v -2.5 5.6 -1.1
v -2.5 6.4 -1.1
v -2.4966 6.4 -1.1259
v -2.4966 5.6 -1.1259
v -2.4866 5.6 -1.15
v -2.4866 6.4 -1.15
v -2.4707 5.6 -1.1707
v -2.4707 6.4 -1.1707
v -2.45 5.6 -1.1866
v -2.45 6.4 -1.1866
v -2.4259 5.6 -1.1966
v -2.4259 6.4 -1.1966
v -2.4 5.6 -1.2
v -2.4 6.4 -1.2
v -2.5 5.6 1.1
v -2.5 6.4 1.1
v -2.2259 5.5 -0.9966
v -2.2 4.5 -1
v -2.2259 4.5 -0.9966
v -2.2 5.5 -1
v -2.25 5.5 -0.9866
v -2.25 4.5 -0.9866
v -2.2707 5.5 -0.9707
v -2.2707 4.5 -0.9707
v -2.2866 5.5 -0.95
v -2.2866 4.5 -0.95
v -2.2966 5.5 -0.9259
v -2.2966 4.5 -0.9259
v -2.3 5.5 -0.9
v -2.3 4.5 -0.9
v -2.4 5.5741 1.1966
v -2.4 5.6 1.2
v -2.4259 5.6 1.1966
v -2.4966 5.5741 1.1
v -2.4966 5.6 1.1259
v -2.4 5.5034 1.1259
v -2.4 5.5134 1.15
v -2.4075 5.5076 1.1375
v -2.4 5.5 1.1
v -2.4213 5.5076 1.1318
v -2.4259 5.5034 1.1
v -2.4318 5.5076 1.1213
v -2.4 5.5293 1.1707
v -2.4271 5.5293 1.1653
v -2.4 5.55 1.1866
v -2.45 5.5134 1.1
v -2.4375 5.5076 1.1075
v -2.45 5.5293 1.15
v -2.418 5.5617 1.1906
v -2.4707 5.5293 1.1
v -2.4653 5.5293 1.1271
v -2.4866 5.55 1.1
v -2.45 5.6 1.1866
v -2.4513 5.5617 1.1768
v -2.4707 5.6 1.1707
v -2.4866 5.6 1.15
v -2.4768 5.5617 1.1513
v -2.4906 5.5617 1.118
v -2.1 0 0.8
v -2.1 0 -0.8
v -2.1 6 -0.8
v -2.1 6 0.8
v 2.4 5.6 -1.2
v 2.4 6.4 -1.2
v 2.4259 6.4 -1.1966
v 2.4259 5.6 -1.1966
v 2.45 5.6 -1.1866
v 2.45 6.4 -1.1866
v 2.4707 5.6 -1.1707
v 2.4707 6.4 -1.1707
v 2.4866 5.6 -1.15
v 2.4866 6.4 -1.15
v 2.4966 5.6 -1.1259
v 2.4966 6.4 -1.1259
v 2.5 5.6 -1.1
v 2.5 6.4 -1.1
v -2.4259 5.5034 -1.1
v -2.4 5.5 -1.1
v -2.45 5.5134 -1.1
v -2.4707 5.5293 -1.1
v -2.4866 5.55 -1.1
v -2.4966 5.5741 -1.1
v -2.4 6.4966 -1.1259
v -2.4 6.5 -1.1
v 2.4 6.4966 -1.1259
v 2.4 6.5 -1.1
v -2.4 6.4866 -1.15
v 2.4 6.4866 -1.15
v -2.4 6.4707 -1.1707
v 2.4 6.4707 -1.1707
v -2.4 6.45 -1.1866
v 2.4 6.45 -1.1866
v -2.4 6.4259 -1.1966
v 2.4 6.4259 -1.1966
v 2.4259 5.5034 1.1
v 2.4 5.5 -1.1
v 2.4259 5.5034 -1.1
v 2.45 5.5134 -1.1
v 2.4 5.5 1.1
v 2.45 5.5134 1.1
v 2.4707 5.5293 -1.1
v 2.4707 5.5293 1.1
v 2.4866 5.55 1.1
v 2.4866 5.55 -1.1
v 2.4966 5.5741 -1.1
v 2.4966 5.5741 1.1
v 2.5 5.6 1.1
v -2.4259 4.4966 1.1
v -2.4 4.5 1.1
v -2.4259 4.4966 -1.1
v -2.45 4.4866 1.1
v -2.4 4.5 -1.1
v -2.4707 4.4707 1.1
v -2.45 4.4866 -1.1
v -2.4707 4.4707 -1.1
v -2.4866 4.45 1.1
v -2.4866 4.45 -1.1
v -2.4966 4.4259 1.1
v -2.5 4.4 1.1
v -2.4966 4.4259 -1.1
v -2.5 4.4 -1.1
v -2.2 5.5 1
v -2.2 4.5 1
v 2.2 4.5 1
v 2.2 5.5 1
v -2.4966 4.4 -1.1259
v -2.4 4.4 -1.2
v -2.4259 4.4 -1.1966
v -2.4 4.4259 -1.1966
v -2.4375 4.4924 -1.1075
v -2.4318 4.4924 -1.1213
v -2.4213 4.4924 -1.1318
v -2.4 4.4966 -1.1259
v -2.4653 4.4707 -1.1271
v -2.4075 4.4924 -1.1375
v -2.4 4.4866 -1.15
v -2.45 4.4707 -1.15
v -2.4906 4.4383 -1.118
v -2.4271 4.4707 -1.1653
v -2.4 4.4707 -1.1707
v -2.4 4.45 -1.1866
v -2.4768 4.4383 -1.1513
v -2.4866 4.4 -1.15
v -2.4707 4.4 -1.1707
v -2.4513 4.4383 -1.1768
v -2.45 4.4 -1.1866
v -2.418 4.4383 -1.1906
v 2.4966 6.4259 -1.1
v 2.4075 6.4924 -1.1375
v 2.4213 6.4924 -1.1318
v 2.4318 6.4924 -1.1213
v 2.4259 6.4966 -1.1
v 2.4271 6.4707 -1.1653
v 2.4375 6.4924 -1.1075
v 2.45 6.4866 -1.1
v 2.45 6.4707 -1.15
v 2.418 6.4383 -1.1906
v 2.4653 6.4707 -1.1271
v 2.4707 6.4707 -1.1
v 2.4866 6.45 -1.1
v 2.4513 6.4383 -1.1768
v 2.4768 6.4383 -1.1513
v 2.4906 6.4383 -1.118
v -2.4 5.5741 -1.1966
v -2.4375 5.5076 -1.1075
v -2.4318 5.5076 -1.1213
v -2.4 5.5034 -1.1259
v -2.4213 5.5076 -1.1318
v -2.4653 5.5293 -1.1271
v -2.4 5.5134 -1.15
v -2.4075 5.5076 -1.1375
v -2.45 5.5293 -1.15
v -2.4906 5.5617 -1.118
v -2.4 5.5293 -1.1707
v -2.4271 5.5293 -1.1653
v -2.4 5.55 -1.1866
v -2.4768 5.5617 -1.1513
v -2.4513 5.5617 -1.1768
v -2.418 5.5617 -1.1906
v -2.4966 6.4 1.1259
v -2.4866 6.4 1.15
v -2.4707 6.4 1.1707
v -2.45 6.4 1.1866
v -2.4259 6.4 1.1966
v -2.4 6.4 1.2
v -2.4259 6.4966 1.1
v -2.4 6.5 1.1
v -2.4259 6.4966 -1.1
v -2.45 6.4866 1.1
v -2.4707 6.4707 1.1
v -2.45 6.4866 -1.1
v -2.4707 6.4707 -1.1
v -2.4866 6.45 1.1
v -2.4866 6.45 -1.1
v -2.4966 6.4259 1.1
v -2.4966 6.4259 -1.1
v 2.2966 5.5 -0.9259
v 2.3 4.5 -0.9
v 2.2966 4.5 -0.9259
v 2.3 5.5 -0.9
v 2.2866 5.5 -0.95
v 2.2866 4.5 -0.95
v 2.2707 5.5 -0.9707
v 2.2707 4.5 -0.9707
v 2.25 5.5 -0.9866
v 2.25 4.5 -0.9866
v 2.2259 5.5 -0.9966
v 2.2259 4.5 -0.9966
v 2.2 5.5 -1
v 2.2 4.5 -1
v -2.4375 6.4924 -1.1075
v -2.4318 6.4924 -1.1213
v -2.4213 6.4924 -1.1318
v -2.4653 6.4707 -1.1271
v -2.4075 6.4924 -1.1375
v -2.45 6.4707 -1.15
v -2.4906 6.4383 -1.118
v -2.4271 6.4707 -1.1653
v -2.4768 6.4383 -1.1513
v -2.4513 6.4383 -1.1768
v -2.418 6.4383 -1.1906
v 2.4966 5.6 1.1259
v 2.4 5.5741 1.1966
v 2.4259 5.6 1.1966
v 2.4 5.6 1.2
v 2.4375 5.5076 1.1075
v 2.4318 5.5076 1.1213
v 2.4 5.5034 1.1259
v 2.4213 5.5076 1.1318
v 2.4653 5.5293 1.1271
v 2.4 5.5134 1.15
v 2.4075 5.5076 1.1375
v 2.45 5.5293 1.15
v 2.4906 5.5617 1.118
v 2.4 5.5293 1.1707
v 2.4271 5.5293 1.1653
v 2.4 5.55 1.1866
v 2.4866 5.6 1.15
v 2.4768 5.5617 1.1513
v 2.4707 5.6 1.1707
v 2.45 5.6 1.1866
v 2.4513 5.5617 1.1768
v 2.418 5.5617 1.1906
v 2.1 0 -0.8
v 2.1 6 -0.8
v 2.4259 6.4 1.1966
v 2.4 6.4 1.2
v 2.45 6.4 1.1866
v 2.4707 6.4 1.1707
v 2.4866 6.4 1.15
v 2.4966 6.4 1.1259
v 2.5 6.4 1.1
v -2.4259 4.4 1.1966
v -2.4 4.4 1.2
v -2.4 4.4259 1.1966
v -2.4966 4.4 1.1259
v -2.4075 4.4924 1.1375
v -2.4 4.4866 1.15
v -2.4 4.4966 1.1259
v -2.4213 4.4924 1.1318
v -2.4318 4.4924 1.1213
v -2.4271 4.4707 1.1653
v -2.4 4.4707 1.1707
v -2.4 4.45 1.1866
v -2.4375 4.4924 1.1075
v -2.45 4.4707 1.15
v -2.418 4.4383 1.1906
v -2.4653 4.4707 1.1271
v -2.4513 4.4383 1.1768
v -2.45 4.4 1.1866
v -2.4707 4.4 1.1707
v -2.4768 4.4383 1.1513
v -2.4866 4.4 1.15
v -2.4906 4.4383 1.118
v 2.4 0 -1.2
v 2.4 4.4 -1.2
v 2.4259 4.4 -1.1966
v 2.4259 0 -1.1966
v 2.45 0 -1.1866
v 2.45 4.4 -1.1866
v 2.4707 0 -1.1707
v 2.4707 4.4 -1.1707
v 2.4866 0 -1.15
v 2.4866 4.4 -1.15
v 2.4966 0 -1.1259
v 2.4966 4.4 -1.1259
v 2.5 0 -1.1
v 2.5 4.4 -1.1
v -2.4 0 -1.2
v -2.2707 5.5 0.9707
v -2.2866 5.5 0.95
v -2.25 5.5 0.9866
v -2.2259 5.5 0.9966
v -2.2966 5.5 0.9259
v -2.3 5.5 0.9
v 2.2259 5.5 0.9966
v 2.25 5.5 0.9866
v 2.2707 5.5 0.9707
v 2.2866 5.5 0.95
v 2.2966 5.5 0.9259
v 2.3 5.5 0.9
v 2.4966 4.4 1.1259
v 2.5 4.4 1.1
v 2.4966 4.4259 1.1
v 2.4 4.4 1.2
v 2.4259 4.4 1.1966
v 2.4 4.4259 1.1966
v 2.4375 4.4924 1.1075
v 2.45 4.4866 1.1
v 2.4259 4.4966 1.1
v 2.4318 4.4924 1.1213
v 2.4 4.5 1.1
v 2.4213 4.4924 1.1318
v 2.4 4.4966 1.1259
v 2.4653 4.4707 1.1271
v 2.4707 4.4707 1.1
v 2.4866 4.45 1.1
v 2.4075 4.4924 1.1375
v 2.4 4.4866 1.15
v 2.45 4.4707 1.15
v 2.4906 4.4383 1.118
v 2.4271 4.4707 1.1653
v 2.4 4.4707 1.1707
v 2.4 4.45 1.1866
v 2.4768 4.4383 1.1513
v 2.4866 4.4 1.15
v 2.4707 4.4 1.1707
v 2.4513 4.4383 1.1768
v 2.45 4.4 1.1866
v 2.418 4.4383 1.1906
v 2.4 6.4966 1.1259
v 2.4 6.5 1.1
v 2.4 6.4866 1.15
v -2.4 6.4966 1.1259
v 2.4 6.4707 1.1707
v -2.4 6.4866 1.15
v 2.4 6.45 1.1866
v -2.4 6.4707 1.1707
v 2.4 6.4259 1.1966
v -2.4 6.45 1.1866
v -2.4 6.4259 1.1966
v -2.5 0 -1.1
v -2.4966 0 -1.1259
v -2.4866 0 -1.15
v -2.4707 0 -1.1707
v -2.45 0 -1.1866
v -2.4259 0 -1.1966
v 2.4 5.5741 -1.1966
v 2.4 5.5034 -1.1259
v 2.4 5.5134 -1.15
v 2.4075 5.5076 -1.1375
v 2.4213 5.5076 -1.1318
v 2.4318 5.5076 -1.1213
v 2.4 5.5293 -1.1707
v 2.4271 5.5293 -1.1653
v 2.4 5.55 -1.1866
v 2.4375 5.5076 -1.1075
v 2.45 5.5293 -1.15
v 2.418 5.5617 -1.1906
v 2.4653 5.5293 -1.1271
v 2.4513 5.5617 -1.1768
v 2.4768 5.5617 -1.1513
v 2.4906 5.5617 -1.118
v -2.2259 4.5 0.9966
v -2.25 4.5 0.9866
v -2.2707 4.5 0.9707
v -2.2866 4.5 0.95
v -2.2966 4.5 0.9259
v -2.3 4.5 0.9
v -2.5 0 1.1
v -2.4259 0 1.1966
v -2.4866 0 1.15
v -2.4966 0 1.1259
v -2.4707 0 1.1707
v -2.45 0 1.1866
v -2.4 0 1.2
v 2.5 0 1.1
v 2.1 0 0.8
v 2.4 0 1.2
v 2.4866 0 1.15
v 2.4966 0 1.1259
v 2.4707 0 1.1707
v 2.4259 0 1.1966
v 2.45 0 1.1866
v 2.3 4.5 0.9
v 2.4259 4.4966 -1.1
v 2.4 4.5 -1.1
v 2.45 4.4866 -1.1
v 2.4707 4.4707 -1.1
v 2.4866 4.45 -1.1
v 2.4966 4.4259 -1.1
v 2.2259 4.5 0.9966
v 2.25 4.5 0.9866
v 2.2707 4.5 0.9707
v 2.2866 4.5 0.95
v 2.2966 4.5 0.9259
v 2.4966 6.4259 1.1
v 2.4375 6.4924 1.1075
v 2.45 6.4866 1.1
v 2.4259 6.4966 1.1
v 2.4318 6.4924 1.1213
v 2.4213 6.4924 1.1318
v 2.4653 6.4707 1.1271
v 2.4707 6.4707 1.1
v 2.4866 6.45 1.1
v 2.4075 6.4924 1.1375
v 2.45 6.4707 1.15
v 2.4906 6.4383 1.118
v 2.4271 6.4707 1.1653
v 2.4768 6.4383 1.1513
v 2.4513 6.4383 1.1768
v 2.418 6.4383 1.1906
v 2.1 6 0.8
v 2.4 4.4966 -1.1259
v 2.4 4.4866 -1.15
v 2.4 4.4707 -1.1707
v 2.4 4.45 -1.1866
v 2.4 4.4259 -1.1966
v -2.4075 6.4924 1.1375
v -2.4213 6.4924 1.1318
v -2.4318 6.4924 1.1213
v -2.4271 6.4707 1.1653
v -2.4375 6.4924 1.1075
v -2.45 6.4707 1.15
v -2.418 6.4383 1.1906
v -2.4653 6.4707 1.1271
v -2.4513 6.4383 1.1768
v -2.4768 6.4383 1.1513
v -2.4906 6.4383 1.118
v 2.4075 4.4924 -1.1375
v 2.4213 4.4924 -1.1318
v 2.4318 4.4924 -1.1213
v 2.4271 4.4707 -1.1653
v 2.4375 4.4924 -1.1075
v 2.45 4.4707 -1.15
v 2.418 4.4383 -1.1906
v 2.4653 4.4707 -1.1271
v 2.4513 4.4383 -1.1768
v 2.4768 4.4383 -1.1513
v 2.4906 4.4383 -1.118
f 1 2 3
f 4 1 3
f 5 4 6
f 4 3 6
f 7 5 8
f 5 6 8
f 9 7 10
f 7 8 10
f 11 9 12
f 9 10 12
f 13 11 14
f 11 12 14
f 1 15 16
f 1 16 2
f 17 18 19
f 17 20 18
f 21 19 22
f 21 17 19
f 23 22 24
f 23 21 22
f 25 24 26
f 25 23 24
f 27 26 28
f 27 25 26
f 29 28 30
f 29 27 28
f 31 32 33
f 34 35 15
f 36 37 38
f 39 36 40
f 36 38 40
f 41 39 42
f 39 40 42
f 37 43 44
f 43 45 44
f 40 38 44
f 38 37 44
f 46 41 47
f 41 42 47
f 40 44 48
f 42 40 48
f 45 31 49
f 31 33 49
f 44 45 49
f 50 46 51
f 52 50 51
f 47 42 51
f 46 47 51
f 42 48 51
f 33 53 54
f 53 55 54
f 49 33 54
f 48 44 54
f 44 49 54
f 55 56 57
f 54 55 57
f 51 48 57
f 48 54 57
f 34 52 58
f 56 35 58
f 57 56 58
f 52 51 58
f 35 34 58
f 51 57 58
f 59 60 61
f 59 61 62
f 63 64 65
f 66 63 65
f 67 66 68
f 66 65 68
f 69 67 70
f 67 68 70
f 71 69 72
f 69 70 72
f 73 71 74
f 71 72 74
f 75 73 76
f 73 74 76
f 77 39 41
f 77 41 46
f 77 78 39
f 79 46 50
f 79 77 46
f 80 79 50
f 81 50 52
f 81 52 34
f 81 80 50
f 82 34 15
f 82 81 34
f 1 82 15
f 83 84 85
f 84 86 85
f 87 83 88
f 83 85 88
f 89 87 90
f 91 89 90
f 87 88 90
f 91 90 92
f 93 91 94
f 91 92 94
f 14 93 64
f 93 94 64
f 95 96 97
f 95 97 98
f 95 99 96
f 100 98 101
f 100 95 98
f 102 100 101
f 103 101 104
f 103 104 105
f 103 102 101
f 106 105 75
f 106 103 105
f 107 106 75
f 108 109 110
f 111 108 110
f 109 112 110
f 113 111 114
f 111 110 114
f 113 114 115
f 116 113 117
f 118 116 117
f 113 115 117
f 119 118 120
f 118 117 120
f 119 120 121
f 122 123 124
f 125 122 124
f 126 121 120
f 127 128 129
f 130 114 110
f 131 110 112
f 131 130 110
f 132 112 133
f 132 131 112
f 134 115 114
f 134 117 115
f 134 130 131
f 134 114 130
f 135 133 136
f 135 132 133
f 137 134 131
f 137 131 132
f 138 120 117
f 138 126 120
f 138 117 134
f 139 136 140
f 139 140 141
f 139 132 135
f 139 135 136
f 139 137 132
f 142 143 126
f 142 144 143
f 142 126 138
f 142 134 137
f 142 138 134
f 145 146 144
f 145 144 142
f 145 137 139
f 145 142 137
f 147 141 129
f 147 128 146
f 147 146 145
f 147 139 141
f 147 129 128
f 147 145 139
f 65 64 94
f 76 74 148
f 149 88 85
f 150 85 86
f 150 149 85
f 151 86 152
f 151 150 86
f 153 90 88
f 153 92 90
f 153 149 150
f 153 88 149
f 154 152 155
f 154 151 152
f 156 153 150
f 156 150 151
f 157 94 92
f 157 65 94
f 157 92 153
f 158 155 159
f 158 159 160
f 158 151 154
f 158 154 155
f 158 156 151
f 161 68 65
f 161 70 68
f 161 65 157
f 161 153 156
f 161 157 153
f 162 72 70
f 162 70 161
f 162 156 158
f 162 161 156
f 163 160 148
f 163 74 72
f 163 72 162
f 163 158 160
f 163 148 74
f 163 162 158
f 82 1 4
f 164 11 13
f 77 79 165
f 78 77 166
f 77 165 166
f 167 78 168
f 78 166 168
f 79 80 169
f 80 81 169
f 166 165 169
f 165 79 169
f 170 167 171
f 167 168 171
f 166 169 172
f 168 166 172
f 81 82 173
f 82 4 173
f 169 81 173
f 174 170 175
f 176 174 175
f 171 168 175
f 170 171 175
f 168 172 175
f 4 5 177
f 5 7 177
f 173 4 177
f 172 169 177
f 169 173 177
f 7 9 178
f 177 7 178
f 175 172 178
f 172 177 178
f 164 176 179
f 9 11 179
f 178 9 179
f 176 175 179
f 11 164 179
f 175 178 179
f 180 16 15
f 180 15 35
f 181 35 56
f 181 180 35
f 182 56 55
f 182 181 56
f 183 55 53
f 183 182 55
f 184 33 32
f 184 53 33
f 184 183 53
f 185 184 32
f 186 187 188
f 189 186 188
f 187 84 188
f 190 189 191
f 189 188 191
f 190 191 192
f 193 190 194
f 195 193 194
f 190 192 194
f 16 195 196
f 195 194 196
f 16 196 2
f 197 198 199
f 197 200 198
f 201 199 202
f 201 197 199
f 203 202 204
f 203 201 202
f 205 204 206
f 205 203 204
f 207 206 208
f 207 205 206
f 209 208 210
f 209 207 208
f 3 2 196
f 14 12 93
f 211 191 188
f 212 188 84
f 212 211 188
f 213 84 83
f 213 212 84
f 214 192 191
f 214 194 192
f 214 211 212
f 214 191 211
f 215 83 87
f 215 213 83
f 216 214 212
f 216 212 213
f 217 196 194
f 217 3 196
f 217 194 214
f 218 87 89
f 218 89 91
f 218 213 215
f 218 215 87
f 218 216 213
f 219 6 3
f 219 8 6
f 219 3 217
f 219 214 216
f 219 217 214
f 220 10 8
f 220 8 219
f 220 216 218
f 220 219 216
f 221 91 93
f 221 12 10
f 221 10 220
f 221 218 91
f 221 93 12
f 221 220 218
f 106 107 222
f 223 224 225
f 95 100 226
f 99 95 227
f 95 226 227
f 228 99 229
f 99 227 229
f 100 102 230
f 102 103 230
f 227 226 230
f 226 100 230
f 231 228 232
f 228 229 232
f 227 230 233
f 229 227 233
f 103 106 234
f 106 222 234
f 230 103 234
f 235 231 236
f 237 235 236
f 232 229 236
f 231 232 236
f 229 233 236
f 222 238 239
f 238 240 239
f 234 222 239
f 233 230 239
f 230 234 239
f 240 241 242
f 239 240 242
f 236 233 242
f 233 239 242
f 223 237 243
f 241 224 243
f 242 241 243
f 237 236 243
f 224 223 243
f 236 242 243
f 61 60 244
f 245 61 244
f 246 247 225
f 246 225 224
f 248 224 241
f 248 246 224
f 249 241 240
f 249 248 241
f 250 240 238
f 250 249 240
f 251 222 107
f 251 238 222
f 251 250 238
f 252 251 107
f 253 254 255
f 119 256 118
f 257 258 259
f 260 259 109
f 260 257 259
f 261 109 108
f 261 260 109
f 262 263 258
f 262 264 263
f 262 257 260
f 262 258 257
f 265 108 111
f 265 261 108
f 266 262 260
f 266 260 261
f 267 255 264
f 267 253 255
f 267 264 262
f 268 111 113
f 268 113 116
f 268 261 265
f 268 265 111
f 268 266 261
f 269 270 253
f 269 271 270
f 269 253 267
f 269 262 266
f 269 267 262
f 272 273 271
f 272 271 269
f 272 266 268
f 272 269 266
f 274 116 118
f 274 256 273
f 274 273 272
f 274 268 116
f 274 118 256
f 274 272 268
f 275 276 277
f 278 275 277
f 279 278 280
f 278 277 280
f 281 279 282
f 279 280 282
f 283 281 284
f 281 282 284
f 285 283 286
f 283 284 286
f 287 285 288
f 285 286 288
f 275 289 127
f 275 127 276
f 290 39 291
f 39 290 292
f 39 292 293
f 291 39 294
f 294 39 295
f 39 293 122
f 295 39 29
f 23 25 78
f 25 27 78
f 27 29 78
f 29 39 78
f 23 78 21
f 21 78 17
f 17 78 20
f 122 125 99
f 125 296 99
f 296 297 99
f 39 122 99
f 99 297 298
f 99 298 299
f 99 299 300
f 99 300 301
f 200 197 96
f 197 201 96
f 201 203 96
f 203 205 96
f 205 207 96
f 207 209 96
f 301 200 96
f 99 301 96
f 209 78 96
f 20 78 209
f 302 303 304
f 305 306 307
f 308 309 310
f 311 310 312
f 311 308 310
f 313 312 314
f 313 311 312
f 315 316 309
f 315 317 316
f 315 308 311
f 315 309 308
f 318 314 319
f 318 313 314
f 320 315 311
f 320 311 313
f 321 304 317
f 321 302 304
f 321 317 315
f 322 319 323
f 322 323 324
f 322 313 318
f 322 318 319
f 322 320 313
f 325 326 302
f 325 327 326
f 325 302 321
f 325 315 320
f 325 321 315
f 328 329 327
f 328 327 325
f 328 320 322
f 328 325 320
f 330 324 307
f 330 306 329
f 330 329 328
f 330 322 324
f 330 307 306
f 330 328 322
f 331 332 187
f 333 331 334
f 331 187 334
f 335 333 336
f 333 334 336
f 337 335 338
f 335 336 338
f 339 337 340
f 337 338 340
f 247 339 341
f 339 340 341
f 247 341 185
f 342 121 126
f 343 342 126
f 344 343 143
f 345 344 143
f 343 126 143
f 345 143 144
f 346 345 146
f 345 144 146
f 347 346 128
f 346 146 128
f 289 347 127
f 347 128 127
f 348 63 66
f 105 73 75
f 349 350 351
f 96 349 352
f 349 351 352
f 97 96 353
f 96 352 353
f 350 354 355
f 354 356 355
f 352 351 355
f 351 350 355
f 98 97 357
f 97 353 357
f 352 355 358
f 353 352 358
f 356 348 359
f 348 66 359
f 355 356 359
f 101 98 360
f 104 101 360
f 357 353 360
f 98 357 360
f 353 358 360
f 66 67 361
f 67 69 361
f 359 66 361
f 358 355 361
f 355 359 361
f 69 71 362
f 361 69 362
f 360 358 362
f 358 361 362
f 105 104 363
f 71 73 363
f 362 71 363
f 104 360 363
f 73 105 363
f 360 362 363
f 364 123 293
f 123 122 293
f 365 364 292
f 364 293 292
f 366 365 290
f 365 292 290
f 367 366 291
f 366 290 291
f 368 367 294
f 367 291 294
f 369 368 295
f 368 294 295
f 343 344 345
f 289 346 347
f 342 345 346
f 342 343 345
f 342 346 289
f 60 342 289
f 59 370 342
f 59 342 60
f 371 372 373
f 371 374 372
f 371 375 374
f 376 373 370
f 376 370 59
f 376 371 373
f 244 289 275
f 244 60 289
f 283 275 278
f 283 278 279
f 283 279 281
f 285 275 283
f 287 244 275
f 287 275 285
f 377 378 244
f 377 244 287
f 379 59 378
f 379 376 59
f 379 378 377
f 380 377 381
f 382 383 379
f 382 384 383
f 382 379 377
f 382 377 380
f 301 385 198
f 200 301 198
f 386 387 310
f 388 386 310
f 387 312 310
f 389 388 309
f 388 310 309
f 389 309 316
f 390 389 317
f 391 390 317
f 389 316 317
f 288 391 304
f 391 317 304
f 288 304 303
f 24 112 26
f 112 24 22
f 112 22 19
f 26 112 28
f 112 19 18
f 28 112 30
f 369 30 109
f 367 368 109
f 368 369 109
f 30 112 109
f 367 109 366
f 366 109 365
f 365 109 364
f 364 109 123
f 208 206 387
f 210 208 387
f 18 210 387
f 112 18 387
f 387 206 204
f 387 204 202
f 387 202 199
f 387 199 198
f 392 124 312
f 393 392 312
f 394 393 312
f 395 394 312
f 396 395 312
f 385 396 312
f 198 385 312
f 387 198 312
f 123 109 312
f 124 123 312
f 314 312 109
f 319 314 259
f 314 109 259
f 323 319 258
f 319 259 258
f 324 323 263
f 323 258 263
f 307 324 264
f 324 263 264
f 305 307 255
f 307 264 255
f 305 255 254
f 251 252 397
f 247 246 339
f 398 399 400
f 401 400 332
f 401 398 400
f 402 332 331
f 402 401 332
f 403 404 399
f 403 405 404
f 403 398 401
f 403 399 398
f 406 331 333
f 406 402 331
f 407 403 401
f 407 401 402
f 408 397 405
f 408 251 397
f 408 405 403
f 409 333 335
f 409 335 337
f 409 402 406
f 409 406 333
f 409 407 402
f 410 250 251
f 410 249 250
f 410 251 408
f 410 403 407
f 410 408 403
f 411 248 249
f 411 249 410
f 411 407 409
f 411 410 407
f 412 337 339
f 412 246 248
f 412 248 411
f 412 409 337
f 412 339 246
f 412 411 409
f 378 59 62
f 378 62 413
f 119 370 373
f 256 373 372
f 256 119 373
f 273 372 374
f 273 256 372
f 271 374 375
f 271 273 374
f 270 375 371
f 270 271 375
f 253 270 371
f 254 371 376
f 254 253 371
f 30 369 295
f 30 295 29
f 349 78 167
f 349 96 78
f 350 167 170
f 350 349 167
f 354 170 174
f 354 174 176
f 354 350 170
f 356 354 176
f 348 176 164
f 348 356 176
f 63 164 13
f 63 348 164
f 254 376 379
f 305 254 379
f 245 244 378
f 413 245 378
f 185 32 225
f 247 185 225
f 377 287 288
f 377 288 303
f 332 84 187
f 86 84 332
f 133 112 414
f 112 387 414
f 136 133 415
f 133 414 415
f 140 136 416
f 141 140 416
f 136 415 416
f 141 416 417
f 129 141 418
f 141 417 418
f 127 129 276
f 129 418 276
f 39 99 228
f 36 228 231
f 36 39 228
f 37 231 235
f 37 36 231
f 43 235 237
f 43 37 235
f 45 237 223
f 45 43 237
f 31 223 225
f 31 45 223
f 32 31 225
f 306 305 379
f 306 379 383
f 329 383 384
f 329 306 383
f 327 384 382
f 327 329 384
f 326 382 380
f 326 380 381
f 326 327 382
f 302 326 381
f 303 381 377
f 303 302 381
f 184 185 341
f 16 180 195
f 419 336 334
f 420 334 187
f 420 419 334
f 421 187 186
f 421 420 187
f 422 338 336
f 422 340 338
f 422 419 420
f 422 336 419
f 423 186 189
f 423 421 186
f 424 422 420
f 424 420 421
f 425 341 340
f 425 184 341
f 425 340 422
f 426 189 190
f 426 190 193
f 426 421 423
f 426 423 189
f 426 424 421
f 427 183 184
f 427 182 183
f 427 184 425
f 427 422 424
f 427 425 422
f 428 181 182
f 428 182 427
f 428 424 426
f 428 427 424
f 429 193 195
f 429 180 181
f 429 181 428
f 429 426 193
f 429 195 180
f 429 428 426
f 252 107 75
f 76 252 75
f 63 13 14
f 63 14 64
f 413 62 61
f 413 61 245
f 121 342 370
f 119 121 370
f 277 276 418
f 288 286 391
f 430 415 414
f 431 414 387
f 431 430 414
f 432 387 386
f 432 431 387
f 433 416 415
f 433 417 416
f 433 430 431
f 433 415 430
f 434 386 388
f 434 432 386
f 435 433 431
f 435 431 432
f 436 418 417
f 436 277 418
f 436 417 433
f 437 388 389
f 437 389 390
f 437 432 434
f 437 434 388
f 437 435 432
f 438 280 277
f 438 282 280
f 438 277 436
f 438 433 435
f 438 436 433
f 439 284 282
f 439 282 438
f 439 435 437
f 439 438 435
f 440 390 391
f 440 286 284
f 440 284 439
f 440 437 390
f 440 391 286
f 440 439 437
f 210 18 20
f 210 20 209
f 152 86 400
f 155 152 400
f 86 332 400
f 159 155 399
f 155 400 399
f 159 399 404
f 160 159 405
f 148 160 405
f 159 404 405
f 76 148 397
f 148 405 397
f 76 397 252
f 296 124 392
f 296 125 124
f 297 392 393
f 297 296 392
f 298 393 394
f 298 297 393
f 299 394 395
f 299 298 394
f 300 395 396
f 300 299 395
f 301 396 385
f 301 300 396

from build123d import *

# Parameters (mm, degrees)
SKETCH_W     = 5
SKETCH_H     = 2.4
PAD_DEPTH    = 4.5
SKETCH001_W  = 4.6
SKETCH001_H  = 2
PAD001_DEPTH = 1
SKETCH002_W  = 5
SKETCH002_H  = 2.4
PAD002_DEPTH = 1
FILLET_R     = 0.1
FILLET001_R  = 0.1
FILLET002_R  = 0.1
SKETCH003_W  = 4.2
SKETCH003_H  = 1.6
POCKET_DEPTH = 6


with BuildPart() as part:
    # Sketch → Pad (new body)
    with BuildSketch(Plane.XZ):
        Rectangle(SKETCH_W, SKETCH_H)
    extrude(amount=-PAD_DEPTH)

    # Sketch001 (on Face6 of Pad) → Pad001 (join)
    with BuildSketch(Plane(origin=(0, 4.5, 0), x_dir=(1, 0, 0), z_dir=(0, 1, 0))):
        Rectangle(SKETCH001_W, SKETCH001_H)
    extrude(amount=PAD001_DEPTH)

    # Sketch002 (on Face11 of Pad001) → Pad002 (join)
    with BuildSketch(Plane(origin=(0, 5.5, 0), x_dir=(1, 0, 0), z_dir=(0, 1, 0))):
        Rectangle(SKETCH002_W, SKETCH002_H)
    extrude(amount=PAD002_DEPTH)

    # Fillet
    fillet_edges = [part.edges().sort_by_distance(p)[0] for p in [
        (2.5, 2.25, 1.2),
        (-2.5, 2.25, 1.2),
        (-2.5, 6, 1.2),
        (2.5, 6, 1.2),
        (2.5, 6, -1.2),
        (2.5, 2.25, -1.2),
        (-2.3, 5, 1),
        (2.3, 5, 1),
        (2.3, 5, -1),
        (-2.5, 2.25, -1.2),
        (-2.5, 6, -1.2),
        (-2.3, 5, -1),
    ]]
    fillet(fillet_edges, radius=FILLET_R)

    # Fillet001
    fillet001_edges = [part.edges().sort_by_distance(p)[0] for p in [
        (0, 6.5, -1.2),
        (2.5, 6.5, 0),
        (0, 6.5, 1.2),
        (-2.5, 6.5, 0),
    ]]
    fillet(fillet001_edges, radius=FILLET001_R)

    # Fillet002
    fillet002_edges = [part.edges().sort_by_distance(p)[0] for p in [
        (0, 5.5, -1.2),
        (0, 4.5, -1.2),
        (-2.5, 4.5, 0),
        (-2.5, 5.5, 0),
        (0, 4.5, 1.2),
        (2.5, 4.5, 0),
        (0, 5.5, 1.2),
        (2.5, 5.5, 0),
    ]]
    fillet(fillet002_edges, radius=FILLET002_R)

    # Sketch003 (on Face49 of Fillet002) → Pocket (cut)
    with BuildSketch(Plane.XZ):
        Rectangle(SKETCH003_W, SKETCH003_H)
    extrude(amount=-POCKET_DEPTH, mode=Mode.SUBTRACT)


solid = part.part
